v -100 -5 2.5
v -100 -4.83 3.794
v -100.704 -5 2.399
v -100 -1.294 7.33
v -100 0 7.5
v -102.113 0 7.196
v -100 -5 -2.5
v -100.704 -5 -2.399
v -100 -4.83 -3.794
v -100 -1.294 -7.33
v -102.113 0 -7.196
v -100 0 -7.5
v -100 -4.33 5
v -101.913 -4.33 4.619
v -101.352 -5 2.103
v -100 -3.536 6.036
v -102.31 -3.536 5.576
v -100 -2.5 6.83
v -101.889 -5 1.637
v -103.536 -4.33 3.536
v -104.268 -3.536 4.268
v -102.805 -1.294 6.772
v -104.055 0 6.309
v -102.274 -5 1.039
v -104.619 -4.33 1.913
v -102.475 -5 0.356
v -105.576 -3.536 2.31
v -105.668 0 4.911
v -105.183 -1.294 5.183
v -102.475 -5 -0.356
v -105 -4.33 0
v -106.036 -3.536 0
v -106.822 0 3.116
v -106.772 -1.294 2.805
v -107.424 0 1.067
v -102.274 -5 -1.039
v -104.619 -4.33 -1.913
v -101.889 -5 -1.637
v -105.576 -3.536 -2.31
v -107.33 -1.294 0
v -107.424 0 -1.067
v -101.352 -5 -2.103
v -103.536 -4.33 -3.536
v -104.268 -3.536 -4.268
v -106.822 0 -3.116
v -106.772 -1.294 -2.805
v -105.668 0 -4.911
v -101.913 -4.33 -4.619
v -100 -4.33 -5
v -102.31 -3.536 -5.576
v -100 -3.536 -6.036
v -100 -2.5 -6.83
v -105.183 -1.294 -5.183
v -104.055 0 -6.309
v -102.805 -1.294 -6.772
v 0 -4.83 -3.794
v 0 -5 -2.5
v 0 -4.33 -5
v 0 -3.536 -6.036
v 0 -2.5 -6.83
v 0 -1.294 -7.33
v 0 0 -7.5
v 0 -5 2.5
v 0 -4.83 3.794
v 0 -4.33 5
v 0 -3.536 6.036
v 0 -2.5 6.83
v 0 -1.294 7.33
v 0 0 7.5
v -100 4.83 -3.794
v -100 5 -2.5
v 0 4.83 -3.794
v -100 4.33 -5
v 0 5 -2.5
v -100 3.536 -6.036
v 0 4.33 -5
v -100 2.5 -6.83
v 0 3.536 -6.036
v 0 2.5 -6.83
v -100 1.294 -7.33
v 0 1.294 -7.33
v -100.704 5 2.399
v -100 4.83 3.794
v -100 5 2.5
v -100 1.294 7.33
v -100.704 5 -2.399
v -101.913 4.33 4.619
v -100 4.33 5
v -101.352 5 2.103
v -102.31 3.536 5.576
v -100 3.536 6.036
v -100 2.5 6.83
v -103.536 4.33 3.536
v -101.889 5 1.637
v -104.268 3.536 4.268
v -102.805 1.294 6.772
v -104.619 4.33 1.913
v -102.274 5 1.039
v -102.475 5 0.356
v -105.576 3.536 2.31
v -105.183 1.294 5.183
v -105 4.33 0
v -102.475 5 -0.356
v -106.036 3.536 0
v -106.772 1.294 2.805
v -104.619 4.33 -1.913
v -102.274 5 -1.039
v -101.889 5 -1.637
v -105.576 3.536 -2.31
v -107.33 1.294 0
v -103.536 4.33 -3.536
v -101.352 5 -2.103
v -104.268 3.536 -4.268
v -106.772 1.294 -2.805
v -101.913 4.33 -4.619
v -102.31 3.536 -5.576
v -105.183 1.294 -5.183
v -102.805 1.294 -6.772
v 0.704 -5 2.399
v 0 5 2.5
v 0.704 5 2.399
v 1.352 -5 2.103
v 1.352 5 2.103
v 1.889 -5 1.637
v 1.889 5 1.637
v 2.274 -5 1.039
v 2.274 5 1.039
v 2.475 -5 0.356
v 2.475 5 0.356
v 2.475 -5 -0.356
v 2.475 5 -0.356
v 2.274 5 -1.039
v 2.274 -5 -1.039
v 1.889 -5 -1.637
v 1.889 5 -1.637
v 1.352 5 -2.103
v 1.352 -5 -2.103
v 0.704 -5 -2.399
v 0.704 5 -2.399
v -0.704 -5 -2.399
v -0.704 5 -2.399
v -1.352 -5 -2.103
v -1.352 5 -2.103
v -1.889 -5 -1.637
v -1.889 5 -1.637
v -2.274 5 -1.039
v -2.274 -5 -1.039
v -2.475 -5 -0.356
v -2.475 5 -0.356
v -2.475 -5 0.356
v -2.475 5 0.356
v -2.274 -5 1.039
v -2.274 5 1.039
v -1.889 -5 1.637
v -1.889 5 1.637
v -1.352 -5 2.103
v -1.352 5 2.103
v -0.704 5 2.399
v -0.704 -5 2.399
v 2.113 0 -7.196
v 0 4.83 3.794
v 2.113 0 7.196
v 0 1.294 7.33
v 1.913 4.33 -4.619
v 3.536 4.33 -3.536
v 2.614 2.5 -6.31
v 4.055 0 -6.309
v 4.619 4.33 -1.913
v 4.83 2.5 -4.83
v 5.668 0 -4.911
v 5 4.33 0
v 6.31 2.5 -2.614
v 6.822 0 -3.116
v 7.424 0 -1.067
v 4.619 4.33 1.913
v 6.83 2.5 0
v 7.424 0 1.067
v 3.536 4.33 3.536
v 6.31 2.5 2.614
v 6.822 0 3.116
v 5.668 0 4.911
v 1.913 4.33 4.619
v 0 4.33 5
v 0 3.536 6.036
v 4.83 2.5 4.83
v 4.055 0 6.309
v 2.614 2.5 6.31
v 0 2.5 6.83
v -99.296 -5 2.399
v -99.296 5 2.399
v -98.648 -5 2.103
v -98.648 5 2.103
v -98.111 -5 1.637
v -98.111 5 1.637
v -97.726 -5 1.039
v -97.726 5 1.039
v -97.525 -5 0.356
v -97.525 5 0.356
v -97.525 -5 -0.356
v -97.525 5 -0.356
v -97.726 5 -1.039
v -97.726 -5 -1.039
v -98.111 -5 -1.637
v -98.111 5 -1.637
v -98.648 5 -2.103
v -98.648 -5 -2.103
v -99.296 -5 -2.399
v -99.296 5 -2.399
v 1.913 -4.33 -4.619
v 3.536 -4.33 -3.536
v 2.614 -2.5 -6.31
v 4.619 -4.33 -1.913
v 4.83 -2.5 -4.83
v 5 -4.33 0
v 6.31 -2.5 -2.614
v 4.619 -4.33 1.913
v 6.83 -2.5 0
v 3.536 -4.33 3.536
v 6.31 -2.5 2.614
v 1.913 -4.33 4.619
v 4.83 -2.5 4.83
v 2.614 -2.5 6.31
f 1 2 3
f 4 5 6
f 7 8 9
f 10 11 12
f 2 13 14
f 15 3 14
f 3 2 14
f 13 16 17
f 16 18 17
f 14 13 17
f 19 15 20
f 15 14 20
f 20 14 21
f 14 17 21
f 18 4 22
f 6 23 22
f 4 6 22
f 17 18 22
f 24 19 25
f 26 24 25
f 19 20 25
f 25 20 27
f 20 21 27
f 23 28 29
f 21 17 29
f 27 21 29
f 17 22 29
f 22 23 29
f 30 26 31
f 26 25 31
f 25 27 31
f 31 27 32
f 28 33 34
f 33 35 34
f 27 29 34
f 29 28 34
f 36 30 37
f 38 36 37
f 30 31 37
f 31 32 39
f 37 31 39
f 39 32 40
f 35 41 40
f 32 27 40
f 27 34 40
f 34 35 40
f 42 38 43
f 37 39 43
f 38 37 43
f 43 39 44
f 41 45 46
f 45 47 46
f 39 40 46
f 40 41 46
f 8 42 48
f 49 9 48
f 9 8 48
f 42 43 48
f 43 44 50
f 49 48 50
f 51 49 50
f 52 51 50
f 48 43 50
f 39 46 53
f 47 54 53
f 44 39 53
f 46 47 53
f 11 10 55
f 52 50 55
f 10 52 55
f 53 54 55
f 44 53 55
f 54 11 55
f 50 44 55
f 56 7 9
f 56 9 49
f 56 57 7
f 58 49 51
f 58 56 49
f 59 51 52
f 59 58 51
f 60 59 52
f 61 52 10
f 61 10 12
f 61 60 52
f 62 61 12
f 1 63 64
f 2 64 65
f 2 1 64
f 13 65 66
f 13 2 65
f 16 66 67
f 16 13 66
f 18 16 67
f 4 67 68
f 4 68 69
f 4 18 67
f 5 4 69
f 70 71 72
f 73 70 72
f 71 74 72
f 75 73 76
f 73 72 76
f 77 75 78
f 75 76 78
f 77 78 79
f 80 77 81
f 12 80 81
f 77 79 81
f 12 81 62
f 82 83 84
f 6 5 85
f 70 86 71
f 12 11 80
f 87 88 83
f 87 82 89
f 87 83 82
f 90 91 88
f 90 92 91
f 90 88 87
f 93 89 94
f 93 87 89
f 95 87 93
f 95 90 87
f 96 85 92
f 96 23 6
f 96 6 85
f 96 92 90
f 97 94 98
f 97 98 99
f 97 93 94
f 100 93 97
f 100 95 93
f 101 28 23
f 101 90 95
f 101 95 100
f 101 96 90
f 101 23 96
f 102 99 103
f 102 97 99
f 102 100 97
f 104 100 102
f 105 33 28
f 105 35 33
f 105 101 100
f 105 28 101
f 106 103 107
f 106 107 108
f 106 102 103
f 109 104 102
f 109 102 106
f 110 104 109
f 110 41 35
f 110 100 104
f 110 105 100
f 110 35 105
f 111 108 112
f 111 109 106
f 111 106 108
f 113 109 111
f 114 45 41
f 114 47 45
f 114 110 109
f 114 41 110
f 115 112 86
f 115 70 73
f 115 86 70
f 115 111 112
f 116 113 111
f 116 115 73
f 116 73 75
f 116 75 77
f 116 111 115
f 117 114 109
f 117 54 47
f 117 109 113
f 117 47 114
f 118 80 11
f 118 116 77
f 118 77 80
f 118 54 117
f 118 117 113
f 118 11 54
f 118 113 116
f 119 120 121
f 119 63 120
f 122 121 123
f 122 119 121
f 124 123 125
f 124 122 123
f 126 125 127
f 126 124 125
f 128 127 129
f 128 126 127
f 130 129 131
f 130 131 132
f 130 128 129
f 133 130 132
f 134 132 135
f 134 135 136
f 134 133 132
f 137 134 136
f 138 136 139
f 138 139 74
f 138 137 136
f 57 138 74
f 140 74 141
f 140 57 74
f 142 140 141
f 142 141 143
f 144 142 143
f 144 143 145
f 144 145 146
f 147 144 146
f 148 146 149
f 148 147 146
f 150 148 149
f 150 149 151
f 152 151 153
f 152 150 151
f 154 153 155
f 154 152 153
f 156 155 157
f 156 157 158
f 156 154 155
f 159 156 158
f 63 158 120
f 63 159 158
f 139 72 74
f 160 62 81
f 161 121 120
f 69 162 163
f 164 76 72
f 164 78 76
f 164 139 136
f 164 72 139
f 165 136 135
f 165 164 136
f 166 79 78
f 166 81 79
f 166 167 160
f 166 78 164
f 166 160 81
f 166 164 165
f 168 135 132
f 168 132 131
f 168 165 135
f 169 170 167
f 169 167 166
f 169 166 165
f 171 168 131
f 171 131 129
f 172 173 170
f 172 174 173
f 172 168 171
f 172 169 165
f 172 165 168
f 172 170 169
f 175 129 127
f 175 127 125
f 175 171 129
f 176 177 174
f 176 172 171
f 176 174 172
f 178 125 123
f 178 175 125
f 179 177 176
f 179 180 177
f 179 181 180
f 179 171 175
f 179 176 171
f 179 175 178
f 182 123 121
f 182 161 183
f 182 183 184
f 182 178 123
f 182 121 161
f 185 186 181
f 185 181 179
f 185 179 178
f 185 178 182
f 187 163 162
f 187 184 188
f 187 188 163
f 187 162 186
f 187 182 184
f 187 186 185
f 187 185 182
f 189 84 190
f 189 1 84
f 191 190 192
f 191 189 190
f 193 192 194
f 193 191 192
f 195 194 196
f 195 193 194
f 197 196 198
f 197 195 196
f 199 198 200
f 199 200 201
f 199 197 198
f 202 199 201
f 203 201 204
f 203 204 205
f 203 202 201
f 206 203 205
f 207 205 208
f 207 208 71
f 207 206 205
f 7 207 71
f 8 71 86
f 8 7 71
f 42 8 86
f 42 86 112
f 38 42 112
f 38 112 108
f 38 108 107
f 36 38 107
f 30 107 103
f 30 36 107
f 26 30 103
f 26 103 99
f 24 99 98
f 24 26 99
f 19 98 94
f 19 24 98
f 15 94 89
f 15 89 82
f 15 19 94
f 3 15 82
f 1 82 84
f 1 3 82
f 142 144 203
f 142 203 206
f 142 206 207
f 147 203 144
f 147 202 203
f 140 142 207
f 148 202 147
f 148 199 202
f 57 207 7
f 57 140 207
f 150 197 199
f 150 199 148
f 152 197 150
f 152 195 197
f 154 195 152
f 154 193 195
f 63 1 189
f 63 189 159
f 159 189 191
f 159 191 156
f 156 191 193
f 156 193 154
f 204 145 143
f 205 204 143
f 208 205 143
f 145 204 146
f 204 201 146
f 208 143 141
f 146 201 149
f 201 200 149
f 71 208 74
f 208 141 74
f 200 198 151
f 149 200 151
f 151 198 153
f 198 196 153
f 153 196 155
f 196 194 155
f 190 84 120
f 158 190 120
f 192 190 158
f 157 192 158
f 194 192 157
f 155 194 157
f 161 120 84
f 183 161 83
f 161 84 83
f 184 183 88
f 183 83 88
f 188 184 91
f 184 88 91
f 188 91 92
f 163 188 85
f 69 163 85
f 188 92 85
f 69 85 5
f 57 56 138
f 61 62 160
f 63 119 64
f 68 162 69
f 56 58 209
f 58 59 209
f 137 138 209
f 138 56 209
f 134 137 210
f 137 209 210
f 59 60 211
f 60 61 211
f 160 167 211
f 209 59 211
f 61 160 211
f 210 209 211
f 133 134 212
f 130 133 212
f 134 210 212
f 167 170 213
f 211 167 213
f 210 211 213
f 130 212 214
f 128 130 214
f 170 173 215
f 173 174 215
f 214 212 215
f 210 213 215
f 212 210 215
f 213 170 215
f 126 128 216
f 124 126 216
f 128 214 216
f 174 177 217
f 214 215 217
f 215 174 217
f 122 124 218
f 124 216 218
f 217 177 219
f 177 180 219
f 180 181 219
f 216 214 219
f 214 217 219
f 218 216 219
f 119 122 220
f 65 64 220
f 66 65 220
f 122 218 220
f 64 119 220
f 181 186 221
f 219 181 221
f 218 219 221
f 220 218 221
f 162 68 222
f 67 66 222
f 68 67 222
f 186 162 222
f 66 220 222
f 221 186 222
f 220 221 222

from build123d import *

# Parameters (mm, degrees)
CROQUIS1_R              = 2.5
SALIENTE_EXTRUIR1_DEPTH = 5
REDONDEO1_R             = 5


with BuildPart() as part:
    # Croquis1 → Saliente-Extruir1 (new, symmetric)
    with BuildSketch(Plane(origin=(0, 0, 0), x_dir=(-1, 0, 0), z_dir=(0, 1, 0))):
        with BuildLine():
            Line((0, 7.5), (100, 7.5))
            ThreePointArc((100, 7.5), (107.5, 0), (100, -7.5))
            Line((100, -7.5), (0, -7.5))
            ThreePointArc((0, -7.5), (-7.5, 0), (0, 7.5))
        make_face()
        with Locations(Location((0, 0, 0), (0, 0, 90))):
            Circle(CROQUIS1_R, mode=Mode.SUBTRACT)
        with Locations(Location((100, 0, 0), (0, 0, 90))):
            Circle(CROQUIS1_R, mode=Mode.SUBTRACT)
    extrude(amount=SALIENTE_EXTRUIR1_DEPTH, both=True)

    # Redondeo1
    redondeo1_edges = [part.edges().sort_by_distance(p)[0] for p in [
        (7.5, 5, 0),
        (-50, 5, 7.5),
        (-107.5, 5, 0),
        (7.5, -5, 0),
        (-50, -5, 7.5),
        (-107.5, -5, 0),
        (-50, 5, -7.5),
        (-50, -5, -7.5),
    ]]
    fillet(redondeo1_edges, radius=REDONDEO1_R - 0.0001)  # a hair under: the kernel refuses the full size


solid = part.part
